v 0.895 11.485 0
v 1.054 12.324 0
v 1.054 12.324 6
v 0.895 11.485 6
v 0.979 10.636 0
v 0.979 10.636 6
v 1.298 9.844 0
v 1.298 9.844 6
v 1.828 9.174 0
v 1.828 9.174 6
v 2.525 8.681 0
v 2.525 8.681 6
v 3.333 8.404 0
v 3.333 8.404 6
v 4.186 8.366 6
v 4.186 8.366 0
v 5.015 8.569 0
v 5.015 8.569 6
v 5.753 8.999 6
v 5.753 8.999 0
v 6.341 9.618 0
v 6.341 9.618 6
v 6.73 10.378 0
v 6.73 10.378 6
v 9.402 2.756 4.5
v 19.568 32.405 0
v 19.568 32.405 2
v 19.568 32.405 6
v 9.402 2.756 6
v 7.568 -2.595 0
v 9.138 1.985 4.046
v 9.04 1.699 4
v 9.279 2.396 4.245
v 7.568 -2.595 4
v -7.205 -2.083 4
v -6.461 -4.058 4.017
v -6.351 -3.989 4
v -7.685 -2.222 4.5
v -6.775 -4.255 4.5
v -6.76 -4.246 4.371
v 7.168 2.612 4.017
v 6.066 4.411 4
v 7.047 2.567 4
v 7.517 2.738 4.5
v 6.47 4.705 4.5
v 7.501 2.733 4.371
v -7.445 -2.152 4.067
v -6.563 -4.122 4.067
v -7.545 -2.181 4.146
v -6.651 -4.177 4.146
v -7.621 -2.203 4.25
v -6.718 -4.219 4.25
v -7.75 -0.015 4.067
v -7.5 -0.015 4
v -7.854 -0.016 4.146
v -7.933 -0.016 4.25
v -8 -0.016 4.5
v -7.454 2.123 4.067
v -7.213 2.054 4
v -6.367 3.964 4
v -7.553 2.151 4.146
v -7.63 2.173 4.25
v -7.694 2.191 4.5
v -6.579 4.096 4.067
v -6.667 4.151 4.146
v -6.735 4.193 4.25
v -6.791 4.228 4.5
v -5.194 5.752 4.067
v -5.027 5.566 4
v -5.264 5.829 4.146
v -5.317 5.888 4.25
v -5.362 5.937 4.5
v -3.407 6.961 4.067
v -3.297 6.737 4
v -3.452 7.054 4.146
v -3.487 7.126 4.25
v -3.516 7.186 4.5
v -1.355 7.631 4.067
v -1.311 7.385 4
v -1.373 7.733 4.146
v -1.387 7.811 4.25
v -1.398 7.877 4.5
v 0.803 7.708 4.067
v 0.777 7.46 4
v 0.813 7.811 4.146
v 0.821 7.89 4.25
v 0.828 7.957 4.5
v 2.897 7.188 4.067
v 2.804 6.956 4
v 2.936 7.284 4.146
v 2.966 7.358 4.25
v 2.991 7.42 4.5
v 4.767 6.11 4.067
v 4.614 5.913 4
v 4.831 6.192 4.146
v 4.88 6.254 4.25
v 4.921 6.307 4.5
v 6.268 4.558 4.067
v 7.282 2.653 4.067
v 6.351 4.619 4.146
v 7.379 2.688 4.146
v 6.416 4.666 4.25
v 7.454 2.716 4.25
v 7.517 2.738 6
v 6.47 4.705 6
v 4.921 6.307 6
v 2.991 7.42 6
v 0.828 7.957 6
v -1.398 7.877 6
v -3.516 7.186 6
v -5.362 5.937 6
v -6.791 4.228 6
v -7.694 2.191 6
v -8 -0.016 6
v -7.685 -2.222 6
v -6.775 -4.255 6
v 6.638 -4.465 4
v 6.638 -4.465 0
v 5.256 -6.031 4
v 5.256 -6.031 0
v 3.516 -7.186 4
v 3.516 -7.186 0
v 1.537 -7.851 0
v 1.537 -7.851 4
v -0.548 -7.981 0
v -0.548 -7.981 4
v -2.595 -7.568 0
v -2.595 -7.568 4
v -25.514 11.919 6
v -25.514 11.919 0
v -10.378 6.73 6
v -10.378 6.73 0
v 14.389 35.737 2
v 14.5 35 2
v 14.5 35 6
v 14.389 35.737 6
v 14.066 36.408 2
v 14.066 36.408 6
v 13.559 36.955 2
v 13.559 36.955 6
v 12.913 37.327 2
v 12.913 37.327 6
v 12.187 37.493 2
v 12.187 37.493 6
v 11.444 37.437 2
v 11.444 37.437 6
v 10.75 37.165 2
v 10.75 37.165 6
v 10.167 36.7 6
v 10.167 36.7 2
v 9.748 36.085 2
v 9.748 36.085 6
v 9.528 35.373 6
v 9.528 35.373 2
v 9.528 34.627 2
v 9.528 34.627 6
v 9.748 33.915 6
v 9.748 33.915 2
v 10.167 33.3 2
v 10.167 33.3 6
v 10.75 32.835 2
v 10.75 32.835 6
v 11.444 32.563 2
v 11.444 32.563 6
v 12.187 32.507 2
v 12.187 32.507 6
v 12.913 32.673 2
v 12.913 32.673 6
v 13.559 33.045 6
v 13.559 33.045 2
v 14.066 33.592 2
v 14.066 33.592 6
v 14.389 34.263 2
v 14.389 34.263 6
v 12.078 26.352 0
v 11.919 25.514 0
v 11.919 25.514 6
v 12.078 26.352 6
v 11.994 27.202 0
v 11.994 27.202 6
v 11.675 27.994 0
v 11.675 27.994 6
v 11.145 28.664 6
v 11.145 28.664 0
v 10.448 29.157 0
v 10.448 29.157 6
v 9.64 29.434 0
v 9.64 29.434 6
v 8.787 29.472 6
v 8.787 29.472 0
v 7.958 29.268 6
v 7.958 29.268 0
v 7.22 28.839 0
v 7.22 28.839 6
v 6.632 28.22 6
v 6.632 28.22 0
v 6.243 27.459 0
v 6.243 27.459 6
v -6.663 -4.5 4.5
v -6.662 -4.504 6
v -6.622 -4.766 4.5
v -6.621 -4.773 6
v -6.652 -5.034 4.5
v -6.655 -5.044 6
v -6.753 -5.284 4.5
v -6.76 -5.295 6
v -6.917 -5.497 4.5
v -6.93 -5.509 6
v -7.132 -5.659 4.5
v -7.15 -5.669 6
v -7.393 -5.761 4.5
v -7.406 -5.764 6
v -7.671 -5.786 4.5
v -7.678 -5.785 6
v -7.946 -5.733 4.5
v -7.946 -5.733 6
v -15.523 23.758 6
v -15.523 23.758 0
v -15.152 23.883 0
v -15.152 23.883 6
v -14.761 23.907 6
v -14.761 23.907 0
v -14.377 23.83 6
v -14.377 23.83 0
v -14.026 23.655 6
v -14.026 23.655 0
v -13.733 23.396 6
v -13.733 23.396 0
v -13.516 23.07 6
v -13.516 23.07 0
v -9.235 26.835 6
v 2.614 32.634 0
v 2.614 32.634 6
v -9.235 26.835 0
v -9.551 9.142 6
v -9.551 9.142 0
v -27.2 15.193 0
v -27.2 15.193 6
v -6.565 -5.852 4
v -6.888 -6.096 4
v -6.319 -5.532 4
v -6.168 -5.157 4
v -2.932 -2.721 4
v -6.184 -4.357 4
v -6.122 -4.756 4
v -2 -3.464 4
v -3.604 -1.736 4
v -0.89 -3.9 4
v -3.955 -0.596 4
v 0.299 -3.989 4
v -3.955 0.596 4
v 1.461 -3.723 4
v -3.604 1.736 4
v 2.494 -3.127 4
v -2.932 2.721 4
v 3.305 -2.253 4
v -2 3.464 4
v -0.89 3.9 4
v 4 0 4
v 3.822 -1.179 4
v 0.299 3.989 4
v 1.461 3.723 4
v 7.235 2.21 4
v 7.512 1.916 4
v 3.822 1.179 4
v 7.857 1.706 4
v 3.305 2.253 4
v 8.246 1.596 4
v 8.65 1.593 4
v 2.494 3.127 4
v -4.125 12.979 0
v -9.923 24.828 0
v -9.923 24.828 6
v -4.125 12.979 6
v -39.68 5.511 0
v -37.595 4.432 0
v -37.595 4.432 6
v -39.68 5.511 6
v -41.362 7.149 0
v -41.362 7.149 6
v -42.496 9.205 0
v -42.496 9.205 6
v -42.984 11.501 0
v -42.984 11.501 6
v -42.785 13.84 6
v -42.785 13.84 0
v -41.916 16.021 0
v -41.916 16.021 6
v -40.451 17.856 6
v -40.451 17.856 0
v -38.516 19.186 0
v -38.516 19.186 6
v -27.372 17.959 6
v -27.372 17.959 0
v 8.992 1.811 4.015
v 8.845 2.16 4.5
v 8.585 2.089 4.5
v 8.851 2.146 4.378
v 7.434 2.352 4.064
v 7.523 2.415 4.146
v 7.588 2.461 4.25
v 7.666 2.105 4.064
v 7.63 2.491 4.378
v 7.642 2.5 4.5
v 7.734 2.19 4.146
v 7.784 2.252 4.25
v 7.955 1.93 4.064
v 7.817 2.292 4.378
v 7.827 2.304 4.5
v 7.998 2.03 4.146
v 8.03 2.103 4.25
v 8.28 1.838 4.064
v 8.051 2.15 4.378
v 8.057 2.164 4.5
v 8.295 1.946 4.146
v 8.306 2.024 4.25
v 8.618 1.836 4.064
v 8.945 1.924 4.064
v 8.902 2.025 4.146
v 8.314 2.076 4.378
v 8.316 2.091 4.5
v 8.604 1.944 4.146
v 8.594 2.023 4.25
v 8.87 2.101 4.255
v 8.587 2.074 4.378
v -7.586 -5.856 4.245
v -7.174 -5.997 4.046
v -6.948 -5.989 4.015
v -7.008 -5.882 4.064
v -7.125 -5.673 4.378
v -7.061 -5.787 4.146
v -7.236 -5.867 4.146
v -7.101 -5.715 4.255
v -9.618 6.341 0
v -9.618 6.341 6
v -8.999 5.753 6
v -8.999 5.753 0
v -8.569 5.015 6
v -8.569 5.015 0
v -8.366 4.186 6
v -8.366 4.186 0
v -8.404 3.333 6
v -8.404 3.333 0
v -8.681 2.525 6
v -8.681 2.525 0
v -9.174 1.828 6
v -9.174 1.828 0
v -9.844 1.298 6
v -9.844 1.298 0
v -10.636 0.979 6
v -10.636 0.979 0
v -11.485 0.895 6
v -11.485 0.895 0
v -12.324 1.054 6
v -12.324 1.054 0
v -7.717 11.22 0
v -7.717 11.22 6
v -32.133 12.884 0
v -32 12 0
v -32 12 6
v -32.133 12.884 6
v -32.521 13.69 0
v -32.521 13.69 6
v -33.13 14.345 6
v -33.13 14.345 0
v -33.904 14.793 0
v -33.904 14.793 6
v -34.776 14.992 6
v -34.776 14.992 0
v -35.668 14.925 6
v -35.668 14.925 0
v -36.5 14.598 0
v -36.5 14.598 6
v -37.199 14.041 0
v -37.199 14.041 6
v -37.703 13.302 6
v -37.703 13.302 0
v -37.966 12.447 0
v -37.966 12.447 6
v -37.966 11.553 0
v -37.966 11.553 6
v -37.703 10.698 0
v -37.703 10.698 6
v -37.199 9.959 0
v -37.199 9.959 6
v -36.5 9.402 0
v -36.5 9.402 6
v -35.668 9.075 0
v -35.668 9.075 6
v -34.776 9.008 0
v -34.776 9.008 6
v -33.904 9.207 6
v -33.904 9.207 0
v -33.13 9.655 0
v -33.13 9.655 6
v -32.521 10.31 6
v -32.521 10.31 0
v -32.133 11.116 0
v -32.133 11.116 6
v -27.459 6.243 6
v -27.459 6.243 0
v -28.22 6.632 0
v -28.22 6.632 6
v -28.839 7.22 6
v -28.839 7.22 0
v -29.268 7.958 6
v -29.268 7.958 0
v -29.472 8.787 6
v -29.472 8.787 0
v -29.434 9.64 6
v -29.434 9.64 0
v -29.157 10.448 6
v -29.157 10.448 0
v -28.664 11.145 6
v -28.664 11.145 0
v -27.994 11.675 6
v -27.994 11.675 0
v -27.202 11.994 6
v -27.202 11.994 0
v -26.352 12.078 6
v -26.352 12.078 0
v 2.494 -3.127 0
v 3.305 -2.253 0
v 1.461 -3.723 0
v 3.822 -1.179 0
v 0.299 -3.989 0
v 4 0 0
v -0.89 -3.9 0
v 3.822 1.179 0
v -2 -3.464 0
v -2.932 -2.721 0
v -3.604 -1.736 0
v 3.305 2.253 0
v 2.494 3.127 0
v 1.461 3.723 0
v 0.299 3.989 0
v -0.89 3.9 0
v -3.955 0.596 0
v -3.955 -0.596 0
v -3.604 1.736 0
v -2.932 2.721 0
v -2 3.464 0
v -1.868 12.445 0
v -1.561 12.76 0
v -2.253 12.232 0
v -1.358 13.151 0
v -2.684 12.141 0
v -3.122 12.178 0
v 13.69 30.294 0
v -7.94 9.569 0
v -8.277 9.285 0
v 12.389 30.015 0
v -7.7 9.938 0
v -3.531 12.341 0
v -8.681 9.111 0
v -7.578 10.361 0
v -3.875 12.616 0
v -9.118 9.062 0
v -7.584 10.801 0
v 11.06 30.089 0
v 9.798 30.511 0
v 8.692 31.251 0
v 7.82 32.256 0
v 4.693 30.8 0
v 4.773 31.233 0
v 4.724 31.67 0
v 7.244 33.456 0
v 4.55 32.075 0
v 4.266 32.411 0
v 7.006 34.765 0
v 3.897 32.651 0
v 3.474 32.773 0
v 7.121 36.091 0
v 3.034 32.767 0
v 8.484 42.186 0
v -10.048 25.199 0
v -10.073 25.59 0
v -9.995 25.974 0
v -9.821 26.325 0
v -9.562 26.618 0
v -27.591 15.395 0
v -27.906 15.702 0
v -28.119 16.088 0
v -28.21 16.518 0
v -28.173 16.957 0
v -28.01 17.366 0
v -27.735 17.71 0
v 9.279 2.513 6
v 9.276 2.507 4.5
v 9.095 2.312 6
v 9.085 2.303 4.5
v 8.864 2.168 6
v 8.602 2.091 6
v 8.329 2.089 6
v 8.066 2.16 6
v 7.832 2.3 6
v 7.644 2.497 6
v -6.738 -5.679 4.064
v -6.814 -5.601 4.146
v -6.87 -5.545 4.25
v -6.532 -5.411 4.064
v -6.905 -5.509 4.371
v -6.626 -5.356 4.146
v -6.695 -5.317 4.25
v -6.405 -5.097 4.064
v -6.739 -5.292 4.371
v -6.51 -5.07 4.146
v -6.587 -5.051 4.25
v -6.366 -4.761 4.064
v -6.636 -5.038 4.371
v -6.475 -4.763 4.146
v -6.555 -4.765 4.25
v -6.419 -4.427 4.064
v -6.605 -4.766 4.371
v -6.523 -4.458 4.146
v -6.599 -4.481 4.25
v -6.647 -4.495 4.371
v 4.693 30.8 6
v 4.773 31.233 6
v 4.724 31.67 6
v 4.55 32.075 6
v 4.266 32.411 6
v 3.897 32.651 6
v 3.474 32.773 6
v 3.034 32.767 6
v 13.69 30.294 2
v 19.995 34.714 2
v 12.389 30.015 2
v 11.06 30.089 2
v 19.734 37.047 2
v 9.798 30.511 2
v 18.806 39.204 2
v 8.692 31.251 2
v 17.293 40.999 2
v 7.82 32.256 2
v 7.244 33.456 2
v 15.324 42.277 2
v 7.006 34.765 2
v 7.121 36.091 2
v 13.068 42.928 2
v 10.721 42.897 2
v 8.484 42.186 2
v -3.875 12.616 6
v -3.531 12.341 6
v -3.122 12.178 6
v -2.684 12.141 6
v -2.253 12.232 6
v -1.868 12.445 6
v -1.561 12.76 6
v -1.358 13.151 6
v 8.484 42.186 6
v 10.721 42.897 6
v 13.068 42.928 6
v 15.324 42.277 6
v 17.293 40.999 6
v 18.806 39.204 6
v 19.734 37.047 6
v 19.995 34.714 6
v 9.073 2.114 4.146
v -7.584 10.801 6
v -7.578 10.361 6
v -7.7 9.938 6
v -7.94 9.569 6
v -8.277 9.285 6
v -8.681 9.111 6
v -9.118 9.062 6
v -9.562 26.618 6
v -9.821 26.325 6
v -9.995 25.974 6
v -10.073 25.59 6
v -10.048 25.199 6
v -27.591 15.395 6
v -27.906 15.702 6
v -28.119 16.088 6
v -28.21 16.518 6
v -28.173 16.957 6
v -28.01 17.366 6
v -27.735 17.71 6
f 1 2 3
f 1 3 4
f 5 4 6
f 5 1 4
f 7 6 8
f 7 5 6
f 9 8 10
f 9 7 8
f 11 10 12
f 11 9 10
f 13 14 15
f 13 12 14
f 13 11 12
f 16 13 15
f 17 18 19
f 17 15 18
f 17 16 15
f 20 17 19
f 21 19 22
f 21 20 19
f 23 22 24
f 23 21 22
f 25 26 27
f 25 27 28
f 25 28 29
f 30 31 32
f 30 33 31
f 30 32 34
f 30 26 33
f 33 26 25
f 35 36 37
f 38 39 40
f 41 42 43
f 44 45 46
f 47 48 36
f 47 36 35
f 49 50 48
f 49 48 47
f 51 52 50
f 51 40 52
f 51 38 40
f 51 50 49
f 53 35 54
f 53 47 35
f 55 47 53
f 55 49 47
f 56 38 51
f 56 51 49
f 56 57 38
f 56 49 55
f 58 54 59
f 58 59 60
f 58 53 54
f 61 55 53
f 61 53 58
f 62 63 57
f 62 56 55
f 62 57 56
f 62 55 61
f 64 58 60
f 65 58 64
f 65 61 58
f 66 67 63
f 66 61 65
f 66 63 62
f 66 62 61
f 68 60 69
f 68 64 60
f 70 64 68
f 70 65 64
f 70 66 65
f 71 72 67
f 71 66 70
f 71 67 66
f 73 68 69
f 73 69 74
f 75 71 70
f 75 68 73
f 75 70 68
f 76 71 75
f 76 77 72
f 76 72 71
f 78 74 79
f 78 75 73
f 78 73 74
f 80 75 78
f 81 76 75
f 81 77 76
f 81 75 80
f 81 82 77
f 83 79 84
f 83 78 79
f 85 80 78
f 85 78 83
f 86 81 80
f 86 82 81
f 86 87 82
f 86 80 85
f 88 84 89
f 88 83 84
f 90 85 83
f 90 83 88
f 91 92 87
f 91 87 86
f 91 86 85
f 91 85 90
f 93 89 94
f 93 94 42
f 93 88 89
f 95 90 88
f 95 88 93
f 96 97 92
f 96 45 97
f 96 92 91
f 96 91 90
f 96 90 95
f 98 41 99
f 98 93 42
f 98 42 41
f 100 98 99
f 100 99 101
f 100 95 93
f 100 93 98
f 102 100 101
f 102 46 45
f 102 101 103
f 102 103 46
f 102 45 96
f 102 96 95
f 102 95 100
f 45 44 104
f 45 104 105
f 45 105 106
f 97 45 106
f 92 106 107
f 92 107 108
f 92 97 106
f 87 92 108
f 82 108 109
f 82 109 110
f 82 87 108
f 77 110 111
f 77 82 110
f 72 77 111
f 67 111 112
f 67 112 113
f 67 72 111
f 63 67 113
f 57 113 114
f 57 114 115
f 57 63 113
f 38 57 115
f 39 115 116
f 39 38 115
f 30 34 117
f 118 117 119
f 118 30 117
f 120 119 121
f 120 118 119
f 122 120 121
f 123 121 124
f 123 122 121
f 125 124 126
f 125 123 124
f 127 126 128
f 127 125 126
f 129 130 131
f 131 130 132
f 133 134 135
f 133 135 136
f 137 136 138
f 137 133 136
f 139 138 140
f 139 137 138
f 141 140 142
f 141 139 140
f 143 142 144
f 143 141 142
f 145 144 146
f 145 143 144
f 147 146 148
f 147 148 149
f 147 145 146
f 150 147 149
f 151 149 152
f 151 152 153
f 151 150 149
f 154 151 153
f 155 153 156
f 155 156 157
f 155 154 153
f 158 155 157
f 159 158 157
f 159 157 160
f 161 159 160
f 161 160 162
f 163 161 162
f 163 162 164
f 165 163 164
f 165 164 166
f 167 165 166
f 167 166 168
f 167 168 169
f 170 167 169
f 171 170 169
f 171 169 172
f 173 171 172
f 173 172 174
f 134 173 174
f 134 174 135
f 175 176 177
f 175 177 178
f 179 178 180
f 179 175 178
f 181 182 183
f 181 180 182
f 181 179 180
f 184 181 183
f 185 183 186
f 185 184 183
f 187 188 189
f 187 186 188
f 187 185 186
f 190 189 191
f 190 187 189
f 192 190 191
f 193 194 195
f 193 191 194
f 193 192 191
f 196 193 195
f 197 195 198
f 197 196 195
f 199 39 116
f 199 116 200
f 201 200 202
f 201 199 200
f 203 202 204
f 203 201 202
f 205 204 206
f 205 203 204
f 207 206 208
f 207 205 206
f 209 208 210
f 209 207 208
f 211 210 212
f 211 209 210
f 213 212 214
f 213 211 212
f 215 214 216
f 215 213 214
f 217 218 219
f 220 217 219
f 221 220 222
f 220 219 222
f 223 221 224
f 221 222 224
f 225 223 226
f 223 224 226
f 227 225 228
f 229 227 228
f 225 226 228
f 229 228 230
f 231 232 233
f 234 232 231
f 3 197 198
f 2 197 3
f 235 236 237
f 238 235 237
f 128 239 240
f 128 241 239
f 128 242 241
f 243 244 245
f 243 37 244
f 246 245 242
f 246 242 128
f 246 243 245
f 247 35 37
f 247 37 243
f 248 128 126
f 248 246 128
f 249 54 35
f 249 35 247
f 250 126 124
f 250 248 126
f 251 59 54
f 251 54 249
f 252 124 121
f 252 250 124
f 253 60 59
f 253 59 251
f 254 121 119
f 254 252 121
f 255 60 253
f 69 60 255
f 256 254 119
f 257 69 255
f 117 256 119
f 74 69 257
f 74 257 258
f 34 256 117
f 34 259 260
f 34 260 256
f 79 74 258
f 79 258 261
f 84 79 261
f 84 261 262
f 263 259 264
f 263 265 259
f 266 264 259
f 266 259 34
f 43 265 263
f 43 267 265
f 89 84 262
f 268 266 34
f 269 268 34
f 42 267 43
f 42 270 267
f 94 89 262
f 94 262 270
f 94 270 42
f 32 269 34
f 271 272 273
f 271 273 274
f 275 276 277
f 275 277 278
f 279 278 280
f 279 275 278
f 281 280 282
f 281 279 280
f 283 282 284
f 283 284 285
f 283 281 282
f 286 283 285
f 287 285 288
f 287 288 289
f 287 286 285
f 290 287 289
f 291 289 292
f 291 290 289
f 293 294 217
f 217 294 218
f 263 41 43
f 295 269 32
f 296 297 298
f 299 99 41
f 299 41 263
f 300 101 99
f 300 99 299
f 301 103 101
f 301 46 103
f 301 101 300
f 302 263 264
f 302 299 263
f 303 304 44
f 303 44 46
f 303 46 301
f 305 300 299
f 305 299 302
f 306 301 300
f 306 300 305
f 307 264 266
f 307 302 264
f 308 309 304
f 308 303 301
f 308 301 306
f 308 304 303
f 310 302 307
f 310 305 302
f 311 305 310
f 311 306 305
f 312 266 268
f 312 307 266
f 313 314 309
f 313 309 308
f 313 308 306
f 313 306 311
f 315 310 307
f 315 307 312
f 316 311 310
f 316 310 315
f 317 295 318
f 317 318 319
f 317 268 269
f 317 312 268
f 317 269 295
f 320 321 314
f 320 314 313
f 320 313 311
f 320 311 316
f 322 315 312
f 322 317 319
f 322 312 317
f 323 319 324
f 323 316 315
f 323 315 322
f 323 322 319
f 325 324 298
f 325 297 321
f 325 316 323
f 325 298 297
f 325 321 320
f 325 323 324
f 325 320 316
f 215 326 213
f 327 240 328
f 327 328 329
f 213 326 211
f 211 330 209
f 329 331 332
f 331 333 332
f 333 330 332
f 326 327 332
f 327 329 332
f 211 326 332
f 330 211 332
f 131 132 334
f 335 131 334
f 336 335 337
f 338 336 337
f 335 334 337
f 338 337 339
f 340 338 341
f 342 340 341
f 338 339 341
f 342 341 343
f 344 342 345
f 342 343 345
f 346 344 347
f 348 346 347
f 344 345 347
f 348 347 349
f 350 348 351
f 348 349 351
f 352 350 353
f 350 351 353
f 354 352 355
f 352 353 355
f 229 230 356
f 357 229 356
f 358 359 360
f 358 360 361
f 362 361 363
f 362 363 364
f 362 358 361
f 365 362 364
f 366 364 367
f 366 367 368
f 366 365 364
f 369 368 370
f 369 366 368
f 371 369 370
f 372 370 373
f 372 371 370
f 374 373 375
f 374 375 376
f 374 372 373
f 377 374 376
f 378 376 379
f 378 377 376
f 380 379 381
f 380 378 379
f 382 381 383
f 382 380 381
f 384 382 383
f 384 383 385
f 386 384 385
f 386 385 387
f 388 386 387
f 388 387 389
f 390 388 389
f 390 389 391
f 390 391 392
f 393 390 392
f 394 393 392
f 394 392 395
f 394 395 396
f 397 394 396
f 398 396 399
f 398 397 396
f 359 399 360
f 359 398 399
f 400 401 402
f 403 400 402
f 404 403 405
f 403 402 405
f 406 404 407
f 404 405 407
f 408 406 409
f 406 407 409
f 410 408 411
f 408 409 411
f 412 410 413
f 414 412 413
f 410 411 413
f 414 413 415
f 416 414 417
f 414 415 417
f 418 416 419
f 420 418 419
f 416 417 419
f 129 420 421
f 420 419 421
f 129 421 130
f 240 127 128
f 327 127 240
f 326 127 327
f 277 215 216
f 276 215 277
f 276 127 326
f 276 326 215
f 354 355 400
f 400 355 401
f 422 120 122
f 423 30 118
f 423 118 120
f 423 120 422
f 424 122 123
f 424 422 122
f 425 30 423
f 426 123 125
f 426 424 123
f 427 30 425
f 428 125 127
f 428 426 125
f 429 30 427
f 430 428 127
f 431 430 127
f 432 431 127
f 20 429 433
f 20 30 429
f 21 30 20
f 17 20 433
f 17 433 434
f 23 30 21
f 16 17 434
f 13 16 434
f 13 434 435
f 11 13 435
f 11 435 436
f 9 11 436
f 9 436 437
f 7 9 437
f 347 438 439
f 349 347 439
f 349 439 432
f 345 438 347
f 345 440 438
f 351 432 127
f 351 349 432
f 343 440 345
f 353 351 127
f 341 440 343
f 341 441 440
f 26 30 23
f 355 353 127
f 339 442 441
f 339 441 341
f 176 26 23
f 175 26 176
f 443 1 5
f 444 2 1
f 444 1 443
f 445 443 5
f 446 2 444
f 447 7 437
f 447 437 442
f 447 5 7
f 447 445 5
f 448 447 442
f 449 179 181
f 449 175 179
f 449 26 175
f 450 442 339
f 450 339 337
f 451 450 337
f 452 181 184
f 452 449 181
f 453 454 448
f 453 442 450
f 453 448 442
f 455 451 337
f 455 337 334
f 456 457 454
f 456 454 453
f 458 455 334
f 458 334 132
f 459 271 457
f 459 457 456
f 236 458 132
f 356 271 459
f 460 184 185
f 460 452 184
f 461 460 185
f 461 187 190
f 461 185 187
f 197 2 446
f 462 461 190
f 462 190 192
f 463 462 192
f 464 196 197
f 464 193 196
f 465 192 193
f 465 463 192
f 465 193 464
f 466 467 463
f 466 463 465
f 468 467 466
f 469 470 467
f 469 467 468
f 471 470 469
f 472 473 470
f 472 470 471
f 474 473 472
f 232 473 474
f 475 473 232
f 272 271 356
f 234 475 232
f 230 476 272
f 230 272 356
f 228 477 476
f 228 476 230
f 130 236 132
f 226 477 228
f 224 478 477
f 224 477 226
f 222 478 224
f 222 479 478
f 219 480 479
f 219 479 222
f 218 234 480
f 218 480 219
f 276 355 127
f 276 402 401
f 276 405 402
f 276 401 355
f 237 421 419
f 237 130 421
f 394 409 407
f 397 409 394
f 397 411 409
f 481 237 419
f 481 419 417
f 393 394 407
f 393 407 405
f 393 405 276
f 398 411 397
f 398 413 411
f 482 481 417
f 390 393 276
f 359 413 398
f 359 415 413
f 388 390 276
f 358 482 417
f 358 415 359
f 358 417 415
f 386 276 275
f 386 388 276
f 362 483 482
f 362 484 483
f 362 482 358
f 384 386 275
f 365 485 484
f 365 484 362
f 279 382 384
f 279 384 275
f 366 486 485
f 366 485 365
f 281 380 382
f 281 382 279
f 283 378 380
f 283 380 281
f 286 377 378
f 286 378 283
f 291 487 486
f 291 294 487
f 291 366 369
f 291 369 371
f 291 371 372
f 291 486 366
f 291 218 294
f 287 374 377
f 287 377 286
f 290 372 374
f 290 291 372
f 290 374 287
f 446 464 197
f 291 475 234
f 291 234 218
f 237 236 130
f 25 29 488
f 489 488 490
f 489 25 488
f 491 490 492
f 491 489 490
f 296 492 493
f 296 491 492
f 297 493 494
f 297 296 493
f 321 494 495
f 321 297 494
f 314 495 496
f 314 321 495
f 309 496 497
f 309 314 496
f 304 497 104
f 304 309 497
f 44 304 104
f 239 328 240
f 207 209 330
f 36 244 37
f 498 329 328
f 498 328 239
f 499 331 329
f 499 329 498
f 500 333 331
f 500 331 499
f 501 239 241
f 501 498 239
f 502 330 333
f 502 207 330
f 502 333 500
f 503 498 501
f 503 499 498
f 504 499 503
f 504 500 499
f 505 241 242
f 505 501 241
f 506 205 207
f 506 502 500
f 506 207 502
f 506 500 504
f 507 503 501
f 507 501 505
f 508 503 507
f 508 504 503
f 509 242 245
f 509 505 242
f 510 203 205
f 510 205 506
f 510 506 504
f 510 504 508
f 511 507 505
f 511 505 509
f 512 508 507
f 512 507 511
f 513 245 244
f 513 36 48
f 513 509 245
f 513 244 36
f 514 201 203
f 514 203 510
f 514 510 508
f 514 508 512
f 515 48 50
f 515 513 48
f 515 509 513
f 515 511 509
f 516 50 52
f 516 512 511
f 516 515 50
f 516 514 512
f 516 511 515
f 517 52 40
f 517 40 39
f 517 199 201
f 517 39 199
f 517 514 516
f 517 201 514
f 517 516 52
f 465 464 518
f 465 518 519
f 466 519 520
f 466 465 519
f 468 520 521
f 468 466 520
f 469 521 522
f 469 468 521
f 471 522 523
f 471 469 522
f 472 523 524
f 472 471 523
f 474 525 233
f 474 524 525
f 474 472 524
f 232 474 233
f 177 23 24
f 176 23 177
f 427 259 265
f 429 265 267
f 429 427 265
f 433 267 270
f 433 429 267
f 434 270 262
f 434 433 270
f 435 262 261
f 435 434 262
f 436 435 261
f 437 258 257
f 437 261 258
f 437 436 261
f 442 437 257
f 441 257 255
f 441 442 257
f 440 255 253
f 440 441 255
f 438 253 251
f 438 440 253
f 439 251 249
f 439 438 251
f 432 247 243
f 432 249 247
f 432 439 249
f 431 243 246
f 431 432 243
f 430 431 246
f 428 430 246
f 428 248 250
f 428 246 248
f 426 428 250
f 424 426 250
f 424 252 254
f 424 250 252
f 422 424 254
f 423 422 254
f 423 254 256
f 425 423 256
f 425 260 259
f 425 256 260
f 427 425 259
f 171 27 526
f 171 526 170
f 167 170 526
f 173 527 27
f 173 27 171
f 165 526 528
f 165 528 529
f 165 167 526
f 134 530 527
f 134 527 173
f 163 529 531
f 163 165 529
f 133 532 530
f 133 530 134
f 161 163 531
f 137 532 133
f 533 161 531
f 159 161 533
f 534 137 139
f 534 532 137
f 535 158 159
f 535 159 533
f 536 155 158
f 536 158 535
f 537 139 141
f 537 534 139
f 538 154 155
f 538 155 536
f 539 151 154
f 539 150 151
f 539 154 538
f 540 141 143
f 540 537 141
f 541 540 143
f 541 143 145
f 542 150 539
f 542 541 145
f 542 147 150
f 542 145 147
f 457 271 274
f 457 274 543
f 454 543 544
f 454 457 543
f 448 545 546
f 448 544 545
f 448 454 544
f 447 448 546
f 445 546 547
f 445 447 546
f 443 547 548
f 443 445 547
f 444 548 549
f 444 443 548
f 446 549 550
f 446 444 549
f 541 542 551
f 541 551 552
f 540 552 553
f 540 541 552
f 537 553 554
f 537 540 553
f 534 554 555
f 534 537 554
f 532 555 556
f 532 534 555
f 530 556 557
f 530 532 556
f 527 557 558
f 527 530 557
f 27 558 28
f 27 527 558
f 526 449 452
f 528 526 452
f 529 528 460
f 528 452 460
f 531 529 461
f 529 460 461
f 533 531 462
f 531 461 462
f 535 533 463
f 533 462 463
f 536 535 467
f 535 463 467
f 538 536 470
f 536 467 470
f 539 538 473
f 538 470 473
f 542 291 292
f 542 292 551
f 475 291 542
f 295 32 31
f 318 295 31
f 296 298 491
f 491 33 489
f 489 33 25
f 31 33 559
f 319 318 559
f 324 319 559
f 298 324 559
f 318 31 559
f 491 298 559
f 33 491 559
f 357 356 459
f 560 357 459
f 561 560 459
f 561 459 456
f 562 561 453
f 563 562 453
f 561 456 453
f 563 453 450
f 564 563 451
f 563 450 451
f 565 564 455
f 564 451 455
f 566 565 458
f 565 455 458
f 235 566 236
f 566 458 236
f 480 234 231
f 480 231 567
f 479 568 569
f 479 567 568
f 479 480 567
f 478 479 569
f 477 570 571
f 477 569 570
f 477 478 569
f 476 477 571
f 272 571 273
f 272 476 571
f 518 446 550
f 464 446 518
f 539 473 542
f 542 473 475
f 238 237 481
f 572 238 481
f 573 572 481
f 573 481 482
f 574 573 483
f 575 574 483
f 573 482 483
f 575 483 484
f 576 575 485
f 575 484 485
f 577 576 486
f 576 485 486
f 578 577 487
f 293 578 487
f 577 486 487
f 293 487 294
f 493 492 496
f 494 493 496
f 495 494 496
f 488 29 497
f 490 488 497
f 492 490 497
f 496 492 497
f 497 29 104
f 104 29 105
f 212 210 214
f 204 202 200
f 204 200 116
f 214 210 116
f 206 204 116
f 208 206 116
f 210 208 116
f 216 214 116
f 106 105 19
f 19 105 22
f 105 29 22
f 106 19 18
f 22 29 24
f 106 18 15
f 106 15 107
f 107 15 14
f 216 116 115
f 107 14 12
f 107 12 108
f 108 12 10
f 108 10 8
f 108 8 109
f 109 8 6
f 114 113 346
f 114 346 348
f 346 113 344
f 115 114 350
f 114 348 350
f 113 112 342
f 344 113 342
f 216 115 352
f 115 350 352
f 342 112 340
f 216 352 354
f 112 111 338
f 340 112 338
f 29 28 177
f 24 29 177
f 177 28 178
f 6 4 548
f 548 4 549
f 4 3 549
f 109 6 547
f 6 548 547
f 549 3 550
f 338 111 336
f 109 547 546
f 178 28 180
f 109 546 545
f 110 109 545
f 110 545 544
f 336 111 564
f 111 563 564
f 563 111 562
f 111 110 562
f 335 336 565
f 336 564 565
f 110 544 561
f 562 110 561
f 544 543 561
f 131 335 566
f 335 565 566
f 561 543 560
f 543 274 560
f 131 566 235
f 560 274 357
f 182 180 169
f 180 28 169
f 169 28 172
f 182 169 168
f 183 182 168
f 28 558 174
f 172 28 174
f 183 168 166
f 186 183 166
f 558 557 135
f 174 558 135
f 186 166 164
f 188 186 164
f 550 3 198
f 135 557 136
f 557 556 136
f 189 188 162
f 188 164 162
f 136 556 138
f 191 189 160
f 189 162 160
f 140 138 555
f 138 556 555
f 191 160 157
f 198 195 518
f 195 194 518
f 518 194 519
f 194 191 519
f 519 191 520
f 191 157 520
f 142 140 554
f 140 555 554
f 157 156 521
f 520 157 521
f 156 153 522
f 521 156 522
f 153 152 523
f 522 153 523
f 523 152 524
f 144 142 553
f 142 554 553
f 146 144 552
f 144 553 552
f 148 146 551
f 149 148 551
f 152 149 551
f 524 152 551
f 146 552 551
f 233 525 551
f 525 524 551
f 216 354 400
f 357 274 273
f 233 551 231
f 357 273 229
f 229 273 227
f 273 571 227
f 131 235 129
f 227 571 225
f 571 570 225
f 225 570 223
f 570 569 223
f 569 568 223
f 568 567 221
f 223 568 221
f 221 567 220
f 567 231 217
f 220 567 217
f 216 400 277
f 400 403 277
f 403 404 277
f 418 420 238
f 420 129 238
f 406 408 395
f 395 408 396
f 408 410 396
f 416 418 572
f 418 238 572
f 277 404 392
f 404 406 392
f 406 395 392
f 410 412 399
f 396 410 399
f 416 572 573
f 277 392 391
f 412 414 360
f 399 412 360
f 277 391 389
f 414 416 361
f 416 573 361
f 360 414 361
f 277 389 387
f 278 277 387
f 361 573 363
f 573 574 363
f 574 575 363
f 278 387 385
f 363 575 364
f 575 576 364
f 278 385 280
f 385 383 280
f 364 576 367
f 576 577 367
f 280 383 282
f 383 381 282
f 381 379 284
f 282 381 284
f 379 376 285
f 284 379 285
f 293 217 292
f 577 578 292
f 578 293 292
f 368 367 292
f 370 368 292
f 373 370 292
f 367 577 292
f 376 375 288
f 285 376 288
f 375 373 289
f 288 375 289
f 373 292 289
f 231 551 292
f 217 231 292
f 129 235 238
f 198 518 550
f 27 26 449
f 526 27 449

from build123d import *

# Parameters (mm, degrees)
SKETCH1_R               = 3
SKETCH1_R_2             = 4
SKETCH1_R_3             = 2.5
BOSS_EXTRUDE1_DEPTH     = 6
CUT_EXTRUDE1_DEPTH      = 62.10646447
CUT_EXTRUDE1_DEPTH_BACK = 62.10646447
CUT_EXTRUDE2_START      = -2
SKETCH4_R               = 8
CUT_EXTRUDE2_DEPTH      = 2
FILLET1_START           = 4
FILLET1_DEPTH           = 2
FILLET2_R               = 0.5
CUT_EXTRUDE4_DEPTH      = 2


with BuildPart() as part:
    # Sketch1 → Boss-Extrude1 (new body)
    with BuildSketch(Plane.XY):
        with BuildLine():
            Line((19.567567568, 32.405405405), (7.567567568, -2.594594595))
            ThreePointArc((7.567567568, -2.594594595), (3.516422912, -7.185733776), (-2.594594595, -7.567567568))
            Line((-2.594594595, -7.567567568), (-37.594594595, 4.432432432))
            ThreePointArc((-37.594594595, 4.432432432), (-42.984429152, 11.50111011), (-38.516422912, 19.185733776))
            Line((-38.516422912, 19.185733776), (8.483577088, 42.185733776))
            ThreePointArc((8.483577088, 42.185733776), (17.293075573, 40.998612422), (19.567567568, 32.405405405))
        make_face()
        with Locations((-35, 12)):
            Circle(SKETCH1_R, mode=Mode.SUBTRACT)
        Circle(SKETCH1_R_2, mode=Mode.SUBTRACT)
        with Locations((12, 35)):
            Circle(SKETCH1_R_3, mode=Mode.SUBTRACT)
    extrude(amount=BOSS_EXTRUDE1_DEPTH)

    # Sketch2 → Cut-Extrude1 (cut, two sides: drawn at the far end of the back side and taken through both)
    with BuildSketch(Plane.XY.offset(6).offset(-CUT_EXTRUDE1_DEPTH_BACK)):
        with BuildLine():
            Line((-27.3724879, 17.959246424), (-15.522864255, 23.75799842))
            ThreePointArc((-15.522864255, 23.75799842), (-14.377048473, 23.829592256), (-13.516209876, 23.070002633))
            Line((-13.516209876, 23.070002633), (-7.71745788, 11.220378988))
            ThreePointArc((-7.71745788, 11.220378988), (-7.940043134, 9.568598022), (-9.551269449, 9.142130773))
            Line((-9.551269449, 9.142130773), (-27.199645091, 15.193002422))
            ThreePointArc((-27.199645091, 15.193002422), (-28.21023907, 16.518379486), (-27.3724879, 17.959246424))
        make_face()
        with BuildLine():
            Line((-25.513513514, 11.918918919), (-10.378378378, 6.72972973))
            ThreePointArc((-10.378378378, 6.72972973), (-8.513513514, 2.918918919), (-12.324324324, 1.054054054))
            Line((-12.324324324, 1.054054054), (-27.459459459, 6.243243243))
            ThreePointArc((-27.459459459, 6.243243243), (-29.324324324, 10.054054054), (-25.513513514, 11.918918919))
        make_face()
        with BuildLine():
            Line((-9.923342988, 24.828214089), (-4.124590991, 12.978590444))
            ThreePointArc((-4.124590991, 12.978590444), (-2.683724054, 12.140839274), (-1.358346989, 13.151433254))
            Line((-1.358346989, 13.151433254), (4.692524659, 30.799808895))
            ThreePointArc((4.692524659, 30.799808895), (4.26605741, 32.41103521), (2.614276444, 32.633620464))
            Line((2.614276444, 32.633620464), (-9.235347201, 26.834868468))
            ThreePointArc((-9.235347201, 26.834868468), (-9.994936824, 25.974029871), (-9.923342988, 24.828214089))
        make_face()
        with BuildLine():
            Line((6.243243243, 27.459459459), (1.054054054, 12.324324324))
            ThreePointArc((1.054054054, 12.324324324), (2.918918919, 8.513513514), (6.72972973, 10.378378378))
            Line((6.72972973, 10.378378378), (11.918918919, 25.513513514))
            ThreePointArc((11.918918919, 25.513513514), (10.054054054, 29.324324324), (6.243243243, 27.459459459))
        make_face()
    extrude(amount=CUT_EXTRUDE1_DEPTH + CUT_EXTRUDE1_DEPTH_BACK, mode=Mode.SUBTRACT)

    # Sketch4 → Cut-Extrude2 (cut)
    with BuildSketch(Plane.XY.offset(6).offset(CUT_EXTRUDE2_START)):
        Circle(SKETCH4_R)
    extrude(amount=CUT_EXTRUDE2_DEPTH, mode=Mode.SUBTRACT)

    # Fillet1: read off the stored shape, not the designer's step
    # Fillet1 outline → Fillet1 (cut)
    with BuildSketch(Plane.XY.offset(FILLET1_START)):
        with BuildLine():
            ThreePointArc((9.402223, 2.75648375), (8.465816464, 2.080853575), (7.516690715, 2.738496066))
            ThreePointArc((7.516690715, 2.738496066), (7.999635991, 0.076315279), (7.567567568, -2.594594595))
            Line((7.567567568, -2.594594595), (9.402223, 2.75648375))
        make_face()
        with BuildLine():
            ThreePointArc((-2.594594595, -7.567567568), (-4.968729766, -6.269906261), (-6.774532102, -4.255081057))
            ThreePointArc((-6.774532102, -4.255081057), (-6.837610332, -5.40805741), (-7.945672939, -5.732912135))
            Line((-7.945672939, -5.732912135), (-2.594594595, -7.567567568))
        make_face()
    extrude(amount=FILLET1_DEPTH, mode=Mode.SUBTRACT)

    # Fillet2
    fillet2_edges = [part.edges().sort_by_distance(p)[0] for p in [
        (-3.516422912, 7.185733776, 4),
        (8.465816464, 2.080853575, 4),
        (-6.837610332, -5.40805741, 4),
    ]]
    fillet(fillet2_edges, radius=FILLET2_R)

    # Sketch5 → Cut-Extrude4 (cut)
    with BuildSketch(Plane(origin=(0, 0, 0), x_dir=(-1, 0, 0), z_dir=(0, 0, -1))):
        with BuildLine():
            Line((-7.12054628, 36.091298034), (-8.483577088, 42.185733776))
            ThreePointArc((-8.483577088, 42.185733776), (-17.293075573, 40.998612422), (-19.567567568, 32.405405405))
            Line((-19.567567568, 32.405405405), (-13.690203108, 30.2943424))
            ThreePointArc((-13.690203108, 30.2943424), (-8.691827767, 31.250867237), (-7.12054628, 36.091298034))
        make_face()
    extrude(amount=-CUT_EXTRUDE4_DEPTH, mode=Mode.SUBTRACT)


solid = part.part
